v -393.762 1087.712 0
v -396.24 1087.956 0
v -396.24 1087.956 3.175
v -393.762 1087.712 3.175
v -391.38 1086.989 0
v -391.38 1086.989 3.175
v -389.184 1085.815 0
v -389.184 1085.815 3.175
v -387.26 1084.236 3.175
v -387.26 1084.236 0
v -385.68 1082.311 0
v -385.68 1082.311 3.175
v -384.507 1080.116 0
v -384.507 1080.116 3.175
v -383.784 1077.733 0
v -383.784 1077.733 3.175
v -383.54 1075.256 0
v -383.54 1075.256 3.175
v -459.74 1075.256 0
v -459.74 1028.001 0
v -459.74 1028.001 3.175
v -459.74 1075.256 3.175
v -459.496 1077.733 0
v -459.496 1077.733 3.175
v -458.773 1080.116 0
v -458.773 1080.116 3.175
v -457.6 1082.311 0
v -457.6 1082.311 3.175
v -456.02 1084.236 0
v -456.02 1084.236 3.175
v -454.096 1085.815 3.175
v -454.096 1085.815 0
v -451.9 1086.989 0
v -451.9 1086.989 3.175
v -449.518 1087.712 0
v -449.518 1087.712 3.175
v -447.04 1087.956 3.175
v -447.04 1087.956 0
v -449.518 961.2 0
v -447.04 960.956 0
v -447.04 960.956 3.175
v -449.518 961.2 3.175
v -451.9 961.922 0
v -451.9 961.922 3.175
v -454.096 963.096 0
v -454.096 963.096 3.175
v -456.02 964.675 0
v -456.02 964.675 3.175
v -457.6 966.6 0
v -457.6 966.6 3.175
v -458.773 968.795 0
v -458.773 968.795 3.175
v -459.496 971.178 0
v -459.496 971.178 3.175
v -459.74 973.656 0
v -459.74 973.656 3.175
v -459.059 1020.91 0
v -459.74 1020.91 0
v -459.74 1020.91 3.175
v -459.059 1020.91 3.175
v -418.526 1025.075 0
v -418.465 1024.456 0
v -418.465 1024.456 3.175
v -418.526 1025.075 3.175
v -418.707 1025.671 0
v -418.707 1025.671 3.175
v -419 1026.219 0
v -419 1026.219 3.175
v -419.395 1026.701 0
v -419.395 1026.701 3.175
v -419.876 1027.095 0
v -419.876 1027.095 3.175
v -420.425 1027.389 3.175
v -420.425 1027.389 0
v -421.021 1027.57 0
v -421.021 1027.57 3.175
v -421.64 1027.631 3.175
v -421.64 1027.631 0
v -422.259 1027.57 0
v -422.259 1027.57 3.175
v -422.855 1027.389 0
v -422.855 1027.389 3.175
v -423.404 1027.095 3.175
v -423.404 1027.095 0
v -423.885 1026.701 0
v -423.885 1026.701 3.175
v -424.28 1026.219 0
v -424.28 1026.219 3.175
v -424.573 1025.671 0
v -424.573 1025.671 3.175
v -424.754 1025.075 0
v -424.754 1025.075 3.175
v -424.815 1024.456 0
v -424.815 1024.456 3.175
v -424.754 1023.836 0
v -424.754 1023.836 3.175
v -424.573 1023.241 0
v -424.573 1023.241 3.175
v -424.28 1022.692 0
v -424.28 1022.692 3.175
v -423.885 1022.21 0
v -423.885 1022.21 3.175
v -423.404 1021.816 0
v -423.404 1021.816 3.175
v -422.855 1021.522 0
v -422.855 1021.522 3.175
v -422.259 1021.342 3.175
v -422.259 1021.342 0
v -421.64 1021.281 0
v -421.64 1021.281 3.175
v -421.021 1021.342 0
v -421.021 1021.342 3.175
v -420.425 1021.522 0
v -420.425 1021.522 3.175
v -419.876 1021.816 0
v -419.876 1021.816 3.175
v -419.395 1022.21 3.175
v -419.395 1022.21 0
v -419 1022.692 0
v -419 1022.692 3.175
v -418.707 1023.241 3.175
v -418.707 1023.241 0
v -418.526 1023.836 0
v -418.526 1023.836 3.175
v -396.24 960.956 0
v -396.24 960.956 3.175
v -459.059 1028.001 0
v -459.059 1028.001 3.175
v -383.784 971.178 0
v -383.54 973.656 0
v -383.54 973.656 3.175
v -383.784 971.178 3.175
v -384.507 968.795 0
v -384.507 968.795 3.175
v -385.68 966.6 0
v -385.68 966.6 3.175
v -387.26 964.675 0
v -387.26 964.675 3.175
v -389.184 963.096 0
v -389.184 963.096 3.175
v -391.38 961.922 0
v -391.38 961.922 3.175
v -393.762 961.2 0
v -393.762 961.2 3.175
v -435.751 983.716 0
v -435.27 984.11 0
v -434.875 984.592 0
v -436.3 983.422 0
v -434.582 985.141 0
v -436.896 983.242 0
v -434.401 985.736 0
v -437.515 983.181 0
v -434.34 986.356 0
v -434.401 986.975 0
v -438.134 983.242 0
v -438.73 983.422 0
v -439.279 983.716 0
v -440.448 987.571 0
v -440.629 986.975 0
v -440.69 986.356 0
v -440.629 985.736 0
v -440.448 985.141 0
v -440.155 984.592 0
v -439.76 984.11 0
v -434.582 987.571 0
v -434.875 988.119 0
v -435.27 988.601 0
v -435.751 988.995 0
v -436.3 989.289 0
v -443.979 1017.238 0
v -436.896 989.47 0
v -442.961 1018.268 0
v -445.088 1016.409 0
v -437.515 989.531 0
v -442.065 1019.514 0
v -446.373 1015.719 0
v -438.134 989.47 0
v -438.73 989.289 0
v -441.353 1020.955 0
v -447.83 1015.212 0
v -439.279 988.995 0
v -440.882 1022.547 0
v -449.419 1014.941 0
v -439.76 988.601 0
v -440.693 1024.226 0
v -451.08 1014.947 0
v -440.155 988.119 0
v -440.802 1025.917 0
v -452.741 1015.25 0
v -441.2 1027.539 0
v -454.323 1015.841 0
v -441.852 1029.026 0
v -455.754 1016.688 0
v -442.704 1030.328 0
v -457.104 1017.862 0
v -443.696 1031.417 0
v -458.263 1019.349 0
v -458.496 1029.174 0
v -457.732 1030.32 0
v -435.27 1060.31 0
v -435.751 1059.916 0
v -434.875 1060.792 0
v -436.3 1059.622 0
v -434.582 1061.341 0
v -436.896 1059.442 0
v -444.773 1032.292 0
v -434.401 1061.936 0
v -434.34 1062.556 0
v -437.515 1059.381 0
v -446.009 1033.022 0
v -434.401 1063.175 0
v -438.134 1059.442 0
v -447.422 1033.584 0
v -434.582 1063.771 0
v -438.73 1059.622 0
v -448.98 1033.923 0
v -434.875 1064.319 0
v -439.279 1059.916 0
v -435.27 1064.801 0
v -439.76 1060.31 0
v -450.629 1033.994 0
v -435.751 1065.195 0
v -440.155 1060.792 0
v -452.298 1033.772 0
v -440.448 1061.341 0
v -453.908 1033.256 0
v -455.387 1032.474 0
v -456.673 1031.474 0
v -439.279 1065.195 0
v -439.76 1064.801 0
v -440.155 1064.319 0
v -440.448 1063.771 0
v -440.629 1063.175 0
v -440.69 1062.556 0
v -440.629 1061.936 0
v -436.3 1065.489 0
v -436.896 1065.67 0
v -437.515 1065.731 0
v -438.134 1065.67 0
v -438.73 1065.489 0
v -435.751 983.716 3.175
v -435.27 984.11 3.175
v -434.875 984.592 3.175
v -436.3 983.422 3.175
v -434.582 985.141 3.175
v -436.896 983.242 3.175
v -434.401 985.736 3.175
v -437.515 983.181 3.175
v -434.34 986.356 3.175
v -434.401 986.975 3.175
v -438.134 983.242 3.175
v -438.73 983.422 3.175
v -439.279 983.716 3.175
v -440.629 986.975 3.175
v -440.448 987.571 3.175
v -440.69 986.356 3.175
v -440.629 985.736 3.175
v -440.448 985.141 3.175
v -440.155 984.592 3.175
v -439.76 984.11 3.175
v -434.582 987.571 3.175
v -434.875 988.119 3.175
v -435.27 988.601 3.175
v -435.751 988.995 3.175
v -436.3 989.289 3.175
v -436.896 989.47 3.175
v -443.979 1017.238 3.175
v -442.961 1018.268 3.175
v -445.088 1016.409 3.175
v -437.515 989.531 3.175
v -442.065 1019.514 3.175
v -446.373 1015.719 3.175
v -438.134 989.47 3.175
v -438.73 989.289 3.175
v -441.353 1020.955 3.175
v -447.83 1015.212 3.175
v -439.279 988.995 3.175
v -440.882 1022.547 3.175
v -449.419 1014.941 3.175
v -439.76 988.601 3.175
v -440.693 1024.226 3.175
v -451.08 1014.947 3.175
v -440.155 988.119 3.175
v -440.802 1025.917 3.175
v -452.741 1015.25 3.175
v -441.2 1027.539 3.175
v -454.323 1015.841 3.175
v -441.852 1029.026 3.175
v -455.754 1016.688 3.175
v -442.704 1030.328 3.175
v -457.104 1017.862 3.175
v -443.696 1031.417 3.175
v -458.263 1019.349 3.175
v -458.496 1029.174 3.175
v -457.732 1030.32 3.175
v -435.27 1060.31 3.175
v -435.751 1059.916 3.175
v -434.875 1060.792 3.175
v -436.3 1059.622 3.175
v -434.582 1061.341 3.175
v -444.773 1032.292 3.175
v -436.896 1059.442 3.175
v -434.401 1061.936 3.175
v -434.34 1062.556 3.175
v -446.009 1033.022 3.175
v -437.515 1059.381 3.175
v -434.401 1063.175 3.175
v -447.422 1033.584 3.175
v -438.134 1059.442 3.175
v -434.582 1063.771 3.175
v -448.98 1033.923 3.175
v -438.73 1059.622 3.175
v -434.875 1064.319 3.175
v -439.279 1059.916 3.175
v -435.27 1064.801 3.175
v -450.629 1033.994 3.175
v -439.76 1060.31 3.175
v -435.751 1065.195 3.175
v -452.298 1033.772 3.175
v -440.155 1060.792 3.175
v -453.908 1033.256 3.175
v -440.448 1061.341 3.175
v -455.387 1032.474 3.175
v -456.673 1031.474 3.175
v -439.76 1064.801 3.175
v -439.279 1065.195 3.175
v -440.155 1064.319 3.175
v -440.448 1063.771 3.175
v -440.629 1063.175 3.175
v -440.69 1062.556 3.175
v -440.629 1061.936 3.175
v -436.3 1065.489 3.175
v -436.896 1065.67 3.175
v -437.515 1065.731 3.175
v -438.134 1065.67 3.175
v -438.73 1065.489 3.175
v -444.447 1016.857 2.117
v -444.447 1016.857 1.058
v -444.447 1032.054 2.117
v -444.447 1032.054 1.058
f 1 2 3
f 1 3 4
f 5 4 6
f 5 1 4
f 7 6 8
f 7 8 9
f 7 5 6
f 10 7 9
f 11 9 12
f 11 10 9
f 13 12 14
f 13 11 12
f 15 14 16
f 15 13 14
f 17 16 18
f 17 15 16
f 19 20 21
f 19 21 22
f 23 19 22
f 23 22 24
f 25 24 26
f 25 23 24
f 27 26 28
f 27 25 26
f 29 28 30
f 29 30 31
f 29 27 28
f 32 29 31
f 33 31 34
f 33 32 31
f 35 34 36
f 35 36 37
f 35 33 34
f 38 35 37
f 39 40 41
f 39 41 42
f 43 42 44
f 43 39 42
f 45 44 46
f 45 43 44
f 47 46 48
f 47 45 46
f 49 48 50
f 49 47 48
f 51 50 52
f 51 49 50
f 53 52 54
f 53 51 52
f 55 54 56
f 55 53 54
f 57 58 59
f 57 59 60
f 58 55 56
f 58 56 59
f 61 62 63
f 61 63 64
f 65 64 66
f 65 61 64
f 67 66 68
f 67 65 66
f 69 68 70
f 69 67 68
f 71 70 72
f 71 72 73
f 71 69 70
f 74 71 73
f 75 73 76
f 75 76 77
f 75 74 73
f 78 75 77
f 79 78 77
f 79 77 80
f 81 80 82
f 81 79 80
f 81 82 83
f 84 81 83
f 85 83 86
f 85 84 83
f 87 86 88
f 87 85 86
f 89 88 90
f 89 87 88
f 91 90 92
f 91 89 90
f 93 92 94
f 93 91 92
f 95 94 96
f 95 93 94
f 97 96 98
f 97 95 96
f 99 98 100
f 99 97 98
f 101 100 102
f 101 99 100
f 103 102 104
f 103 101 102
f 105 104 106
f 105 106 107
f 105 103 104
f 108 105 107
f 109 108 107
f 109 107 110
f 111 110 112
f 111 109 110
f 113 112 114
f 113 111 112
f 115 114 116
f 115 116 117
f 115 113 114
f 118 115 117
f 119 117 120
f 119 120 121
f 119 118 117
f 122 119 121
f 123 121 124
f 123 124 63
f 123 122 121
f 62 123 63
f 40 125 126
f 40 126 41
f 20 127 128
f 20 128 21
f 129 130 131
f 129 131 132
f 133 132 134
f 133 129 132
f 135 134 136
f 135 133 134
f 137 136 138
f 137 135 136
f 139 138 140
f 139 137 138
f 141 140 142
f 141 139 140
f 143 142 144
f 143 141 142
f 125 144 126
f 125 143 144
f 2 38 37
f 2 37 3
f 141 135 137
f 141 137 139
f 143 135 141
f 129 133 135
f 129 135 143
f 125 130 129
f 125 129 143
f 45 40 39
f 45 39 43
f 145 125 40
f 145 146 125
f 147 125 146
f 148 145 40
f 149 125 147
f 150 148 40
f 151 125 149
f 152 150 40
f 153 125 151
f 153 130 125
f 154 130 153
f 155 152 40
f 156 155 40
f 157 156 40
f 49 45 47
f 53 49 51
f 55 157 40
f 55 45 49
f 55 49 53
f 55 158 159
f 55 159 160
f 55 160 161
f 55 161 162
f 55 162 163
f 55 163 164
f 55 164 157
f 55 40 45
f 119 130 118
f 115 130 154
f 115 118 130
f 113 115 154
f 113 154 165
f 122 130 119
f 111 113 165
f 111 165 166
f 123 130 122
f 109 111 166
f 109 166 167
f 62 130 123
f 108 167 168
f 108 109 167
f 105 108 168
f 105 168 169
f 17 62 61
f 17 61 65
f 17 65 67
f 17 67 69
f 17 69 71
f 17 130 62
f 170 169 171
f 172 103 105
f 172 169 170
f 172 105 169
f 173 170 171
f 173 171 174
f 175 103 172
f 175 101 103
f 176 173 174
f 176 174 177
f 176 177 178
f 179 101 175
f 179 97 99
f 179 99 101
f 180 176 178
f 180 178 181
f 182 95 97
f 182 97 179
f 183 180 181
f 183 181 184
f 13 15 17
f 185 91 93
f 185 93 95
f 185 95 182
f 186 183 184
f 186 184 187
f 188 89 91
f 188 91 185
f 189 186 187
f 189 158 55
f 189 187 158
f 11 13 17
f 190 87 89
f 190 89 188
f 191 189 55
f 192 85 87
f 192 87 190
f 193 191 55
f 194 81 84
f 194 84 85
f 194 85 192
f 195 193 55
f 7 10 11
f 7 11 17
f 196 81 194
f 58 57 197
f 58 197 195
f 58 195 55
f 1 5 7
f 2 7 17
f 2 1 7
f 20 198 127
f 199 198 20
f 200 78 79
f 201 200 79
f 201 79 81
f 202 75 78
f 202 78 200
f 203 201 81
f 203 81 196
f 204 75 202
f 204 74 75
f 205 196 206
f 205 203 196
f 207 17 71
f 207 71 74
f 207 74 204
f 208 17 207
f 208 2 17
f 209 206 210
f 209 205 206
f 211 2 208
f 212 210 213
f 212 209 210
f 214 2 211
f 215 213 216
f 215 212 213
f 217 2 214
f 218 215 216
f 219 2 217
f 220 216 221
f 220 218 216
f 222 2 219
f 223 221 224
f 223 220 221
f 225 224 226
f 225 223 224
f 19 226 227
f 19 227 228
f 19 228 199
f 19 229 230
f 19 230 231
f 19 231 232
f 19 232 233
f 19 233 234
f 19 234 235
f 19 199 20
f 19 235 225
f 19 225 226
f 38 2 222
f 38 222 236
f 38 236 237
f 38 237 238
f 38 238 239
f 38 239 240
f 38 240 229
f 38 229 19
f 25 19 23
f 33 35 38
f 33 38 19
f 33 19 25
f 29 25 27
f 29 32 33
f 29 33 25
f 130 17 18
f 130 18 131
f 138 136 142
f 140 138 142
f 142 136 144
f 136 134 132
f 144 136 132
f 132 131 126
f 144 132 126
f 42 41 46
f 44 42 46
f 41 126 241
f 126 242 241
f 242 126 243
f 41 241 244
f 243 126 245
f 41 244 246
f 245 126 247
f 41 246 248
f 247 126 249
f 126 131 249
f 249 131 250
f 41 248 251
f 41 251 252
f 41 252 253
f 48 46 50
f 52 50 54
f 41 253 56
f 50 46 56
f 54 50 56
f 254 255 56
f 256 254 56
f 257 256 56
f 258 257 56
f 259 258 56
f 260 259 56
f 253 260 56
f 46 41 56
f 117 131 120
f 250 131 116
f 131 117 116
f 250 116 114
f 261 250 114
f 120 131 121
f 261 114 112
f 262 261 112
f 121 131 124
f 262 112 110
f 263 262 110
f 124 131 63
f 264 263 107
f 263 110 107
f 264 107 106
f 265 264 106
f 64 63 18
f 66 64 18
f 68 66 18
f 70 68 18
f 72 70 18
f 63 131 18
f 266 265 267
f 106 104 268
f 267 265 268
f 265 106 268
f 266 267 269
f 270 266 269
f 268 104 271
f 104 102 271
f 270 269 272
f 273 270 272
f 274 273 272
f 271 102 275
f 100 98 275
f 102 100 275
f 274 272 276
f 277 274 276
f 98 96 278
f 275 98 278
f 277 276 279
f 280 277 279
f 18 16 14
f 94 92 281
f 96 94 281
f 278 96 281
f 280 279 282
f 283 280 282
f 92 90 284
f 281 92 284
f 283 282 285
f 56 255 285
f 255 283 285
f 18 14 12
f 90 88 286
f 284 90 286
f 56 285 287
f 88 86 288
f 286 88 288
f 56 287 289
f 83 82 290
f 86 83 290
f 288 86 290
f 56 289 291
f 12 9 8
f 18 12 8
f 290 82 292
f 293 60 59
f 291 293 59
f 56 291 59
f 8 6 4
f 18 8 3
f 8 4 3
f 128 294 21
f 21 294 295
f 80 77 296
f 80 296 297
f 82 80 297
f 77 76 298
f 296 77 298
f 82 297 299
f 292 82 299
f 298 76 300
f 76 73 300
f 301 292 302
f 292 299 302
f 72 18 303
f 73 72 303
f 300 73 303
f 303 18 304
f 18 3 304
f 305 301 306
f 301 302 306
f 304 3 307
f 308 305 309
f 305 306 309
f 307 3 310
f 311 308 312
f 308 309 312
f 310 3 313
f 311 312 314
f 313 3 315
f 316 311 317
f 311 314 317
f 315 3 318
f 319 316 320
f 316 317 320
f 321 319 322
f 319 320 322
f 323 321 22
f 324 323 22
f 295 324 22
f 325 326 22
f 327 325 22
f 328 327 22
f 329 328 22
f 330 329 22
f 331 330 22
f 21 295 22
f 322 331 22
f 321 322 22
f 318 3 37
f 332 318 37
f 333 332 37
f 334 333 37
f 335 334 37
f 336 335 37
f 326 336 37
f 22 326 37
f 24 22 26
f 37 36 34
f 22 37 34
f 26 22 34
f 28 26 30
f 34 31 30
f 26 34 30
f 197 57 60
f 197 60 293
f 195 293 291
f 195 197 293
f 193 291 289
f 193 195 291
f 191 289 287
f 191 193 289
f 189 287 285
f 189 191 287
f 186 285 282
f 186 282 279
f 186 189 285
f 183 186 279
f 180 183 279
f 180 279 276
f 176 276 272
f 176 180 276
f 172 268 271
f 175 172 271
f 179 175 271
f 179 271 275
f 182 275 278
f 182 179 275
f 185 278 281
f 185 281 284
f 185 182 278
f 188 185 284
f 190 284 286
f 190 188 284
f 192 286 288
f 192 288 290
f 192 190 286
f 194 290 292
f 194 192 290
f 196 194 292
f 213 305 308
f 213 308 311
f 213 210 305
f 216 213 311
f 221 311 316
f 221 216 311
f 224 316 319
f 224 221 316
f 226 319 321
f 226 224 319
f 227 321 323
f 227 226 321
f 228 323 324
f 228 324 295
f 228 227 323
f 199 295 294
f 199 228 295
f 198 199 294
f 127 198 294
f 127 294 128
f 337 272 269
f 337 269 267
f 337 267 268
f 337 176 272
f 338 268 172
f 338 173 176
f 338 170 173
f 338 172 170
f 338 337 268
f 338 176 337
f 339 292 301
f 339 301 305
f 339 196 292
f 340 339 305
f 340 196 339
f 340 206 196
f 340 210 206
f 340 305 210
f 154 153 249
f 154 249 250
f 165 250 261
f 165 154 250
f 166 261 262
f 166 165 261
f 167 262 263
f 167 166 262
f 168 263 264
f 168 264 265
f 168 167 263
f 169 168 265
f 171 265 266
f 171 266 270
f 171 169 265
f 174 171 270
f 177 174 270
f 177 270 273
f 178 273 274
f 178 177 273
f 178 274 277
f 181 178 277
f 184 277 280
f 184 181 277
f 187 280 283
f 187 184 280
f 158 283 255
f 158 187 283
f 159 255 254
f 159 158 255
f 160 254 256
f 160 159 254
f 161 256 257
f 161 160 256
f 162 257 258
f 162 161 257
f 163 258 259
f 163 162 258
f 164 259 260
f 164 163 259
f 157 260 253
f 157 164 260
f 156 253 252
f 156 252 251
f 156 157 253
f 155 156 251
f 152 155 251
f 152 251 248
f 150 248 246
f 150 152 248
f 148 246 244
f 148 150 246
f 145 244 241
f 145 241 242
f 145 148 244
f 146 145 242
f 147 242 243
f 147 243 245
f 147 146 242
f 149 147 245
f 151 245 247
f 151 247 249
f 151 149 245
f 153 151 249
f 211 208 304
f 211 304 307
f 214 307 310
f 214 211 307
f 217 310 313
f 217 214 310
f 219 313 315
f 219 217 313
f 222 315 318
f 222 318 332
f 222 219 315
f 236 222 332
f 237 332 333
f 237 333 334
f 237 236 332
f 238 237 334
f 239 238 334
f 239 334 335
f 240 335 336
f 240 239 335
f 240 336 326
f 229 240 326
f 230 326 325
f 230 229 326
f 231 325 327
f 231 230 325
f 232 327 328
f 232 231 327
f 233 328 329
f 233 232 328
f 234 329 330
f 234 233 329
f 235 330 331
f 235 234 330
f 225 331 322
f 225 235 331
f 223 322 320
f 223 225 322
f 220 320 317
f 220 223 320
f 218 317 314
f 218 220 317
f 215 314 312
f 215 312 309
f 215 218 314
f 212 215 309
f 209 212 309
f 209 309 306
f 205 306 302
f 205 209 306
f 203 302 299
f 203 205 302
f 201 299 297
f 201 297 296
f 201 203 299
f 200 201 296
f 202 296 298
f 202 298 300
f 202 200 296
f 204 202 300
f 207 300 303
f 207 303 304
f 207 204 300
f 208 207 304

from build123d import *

# Parameters (mm, degrees)
SKETCH1_R           = 3.175
BOSS_EXTRUDE2_DEPTH = 3.175


with BuildPart() as part:
    # Sketch1 → Boss-Extrude2 (new body)
    with BuildSketch(Plane.XY):
        with BuildLine():
            add(Edge.make_bspline(
                [(-459.058883104, 1020.90986665), (-454.410065073, 1009.258459074), (-444.447409236, 1016.856993556), (-434.4847534, 1024.455528037), (-444.447409236, 1032.054062519), (-454.410065073, 1039.652597001), (-459.058883104, 1028.001189425)],
                knots=[1.951262384, 1.951262384, 1.951262384, 3.792013448, 3.792013448, 5.632764512, 5.632764512, 7.473515577, 7.473515577, 7.473515577], degree=2, weights=[1, 0.60552134, 1, 0.60552134, 1, 0.60552134, 1]))
            Line((-459.058883104, 1028.001189425), (-459.74, 1028.001189425))
            Line((-459.74, 1028.001189425), (-459.74, 1075.255528037))
            ThreePointArc((-459.74, 1075.255528037), (-456.020256121, 1084.235784159), (-447.04, 1087.955528037))
            Line((-447.04, 1087.955528037), (-396.24, 1087.955528037))
            ThreePointArc((-396.24, 1087.955528037), (-387.259743879, 1084.235784159), (-383.54, 1075.255528037))
            Line((-383.54, 1075.255528037), (-383.54, 973.655528037))
            ThreePointArc((-383.54, 973.655528037), (-387.259743879, 964.675271916), (-396.24, 960.955528037))
            Line((-396.24, 960.955528037), (-447.04, 960.955528037))
            ThreePointArc((-447.04, 960.955528037), (-456.020256121, 964.675271916), (-459.74, 973.655528037))
            Line((-459.74, 973.655528037), (-459.74, 1020.90986665))
            Line((-459.74, 1020.90986665), (-459.058883104, 1020.90986665))
        make_face()
        with Locations((-421.64, 1024.455528037)):
            Circle(SKETCH1_R, mode=Mode.SUBTRACT)
        with Locations((-437.515, 986.355528037)):
            Circle(SKETCH1_R, mode=Mode.SUBTRACT)
        with Locations((-437.515, 1062.555528037)):
            Circle(SKETCH1_R, mode=Mode.SUBTRACT)
    extrude(amount=BOSS_EXTRUDE2_DEPTH)


solid = part.part
